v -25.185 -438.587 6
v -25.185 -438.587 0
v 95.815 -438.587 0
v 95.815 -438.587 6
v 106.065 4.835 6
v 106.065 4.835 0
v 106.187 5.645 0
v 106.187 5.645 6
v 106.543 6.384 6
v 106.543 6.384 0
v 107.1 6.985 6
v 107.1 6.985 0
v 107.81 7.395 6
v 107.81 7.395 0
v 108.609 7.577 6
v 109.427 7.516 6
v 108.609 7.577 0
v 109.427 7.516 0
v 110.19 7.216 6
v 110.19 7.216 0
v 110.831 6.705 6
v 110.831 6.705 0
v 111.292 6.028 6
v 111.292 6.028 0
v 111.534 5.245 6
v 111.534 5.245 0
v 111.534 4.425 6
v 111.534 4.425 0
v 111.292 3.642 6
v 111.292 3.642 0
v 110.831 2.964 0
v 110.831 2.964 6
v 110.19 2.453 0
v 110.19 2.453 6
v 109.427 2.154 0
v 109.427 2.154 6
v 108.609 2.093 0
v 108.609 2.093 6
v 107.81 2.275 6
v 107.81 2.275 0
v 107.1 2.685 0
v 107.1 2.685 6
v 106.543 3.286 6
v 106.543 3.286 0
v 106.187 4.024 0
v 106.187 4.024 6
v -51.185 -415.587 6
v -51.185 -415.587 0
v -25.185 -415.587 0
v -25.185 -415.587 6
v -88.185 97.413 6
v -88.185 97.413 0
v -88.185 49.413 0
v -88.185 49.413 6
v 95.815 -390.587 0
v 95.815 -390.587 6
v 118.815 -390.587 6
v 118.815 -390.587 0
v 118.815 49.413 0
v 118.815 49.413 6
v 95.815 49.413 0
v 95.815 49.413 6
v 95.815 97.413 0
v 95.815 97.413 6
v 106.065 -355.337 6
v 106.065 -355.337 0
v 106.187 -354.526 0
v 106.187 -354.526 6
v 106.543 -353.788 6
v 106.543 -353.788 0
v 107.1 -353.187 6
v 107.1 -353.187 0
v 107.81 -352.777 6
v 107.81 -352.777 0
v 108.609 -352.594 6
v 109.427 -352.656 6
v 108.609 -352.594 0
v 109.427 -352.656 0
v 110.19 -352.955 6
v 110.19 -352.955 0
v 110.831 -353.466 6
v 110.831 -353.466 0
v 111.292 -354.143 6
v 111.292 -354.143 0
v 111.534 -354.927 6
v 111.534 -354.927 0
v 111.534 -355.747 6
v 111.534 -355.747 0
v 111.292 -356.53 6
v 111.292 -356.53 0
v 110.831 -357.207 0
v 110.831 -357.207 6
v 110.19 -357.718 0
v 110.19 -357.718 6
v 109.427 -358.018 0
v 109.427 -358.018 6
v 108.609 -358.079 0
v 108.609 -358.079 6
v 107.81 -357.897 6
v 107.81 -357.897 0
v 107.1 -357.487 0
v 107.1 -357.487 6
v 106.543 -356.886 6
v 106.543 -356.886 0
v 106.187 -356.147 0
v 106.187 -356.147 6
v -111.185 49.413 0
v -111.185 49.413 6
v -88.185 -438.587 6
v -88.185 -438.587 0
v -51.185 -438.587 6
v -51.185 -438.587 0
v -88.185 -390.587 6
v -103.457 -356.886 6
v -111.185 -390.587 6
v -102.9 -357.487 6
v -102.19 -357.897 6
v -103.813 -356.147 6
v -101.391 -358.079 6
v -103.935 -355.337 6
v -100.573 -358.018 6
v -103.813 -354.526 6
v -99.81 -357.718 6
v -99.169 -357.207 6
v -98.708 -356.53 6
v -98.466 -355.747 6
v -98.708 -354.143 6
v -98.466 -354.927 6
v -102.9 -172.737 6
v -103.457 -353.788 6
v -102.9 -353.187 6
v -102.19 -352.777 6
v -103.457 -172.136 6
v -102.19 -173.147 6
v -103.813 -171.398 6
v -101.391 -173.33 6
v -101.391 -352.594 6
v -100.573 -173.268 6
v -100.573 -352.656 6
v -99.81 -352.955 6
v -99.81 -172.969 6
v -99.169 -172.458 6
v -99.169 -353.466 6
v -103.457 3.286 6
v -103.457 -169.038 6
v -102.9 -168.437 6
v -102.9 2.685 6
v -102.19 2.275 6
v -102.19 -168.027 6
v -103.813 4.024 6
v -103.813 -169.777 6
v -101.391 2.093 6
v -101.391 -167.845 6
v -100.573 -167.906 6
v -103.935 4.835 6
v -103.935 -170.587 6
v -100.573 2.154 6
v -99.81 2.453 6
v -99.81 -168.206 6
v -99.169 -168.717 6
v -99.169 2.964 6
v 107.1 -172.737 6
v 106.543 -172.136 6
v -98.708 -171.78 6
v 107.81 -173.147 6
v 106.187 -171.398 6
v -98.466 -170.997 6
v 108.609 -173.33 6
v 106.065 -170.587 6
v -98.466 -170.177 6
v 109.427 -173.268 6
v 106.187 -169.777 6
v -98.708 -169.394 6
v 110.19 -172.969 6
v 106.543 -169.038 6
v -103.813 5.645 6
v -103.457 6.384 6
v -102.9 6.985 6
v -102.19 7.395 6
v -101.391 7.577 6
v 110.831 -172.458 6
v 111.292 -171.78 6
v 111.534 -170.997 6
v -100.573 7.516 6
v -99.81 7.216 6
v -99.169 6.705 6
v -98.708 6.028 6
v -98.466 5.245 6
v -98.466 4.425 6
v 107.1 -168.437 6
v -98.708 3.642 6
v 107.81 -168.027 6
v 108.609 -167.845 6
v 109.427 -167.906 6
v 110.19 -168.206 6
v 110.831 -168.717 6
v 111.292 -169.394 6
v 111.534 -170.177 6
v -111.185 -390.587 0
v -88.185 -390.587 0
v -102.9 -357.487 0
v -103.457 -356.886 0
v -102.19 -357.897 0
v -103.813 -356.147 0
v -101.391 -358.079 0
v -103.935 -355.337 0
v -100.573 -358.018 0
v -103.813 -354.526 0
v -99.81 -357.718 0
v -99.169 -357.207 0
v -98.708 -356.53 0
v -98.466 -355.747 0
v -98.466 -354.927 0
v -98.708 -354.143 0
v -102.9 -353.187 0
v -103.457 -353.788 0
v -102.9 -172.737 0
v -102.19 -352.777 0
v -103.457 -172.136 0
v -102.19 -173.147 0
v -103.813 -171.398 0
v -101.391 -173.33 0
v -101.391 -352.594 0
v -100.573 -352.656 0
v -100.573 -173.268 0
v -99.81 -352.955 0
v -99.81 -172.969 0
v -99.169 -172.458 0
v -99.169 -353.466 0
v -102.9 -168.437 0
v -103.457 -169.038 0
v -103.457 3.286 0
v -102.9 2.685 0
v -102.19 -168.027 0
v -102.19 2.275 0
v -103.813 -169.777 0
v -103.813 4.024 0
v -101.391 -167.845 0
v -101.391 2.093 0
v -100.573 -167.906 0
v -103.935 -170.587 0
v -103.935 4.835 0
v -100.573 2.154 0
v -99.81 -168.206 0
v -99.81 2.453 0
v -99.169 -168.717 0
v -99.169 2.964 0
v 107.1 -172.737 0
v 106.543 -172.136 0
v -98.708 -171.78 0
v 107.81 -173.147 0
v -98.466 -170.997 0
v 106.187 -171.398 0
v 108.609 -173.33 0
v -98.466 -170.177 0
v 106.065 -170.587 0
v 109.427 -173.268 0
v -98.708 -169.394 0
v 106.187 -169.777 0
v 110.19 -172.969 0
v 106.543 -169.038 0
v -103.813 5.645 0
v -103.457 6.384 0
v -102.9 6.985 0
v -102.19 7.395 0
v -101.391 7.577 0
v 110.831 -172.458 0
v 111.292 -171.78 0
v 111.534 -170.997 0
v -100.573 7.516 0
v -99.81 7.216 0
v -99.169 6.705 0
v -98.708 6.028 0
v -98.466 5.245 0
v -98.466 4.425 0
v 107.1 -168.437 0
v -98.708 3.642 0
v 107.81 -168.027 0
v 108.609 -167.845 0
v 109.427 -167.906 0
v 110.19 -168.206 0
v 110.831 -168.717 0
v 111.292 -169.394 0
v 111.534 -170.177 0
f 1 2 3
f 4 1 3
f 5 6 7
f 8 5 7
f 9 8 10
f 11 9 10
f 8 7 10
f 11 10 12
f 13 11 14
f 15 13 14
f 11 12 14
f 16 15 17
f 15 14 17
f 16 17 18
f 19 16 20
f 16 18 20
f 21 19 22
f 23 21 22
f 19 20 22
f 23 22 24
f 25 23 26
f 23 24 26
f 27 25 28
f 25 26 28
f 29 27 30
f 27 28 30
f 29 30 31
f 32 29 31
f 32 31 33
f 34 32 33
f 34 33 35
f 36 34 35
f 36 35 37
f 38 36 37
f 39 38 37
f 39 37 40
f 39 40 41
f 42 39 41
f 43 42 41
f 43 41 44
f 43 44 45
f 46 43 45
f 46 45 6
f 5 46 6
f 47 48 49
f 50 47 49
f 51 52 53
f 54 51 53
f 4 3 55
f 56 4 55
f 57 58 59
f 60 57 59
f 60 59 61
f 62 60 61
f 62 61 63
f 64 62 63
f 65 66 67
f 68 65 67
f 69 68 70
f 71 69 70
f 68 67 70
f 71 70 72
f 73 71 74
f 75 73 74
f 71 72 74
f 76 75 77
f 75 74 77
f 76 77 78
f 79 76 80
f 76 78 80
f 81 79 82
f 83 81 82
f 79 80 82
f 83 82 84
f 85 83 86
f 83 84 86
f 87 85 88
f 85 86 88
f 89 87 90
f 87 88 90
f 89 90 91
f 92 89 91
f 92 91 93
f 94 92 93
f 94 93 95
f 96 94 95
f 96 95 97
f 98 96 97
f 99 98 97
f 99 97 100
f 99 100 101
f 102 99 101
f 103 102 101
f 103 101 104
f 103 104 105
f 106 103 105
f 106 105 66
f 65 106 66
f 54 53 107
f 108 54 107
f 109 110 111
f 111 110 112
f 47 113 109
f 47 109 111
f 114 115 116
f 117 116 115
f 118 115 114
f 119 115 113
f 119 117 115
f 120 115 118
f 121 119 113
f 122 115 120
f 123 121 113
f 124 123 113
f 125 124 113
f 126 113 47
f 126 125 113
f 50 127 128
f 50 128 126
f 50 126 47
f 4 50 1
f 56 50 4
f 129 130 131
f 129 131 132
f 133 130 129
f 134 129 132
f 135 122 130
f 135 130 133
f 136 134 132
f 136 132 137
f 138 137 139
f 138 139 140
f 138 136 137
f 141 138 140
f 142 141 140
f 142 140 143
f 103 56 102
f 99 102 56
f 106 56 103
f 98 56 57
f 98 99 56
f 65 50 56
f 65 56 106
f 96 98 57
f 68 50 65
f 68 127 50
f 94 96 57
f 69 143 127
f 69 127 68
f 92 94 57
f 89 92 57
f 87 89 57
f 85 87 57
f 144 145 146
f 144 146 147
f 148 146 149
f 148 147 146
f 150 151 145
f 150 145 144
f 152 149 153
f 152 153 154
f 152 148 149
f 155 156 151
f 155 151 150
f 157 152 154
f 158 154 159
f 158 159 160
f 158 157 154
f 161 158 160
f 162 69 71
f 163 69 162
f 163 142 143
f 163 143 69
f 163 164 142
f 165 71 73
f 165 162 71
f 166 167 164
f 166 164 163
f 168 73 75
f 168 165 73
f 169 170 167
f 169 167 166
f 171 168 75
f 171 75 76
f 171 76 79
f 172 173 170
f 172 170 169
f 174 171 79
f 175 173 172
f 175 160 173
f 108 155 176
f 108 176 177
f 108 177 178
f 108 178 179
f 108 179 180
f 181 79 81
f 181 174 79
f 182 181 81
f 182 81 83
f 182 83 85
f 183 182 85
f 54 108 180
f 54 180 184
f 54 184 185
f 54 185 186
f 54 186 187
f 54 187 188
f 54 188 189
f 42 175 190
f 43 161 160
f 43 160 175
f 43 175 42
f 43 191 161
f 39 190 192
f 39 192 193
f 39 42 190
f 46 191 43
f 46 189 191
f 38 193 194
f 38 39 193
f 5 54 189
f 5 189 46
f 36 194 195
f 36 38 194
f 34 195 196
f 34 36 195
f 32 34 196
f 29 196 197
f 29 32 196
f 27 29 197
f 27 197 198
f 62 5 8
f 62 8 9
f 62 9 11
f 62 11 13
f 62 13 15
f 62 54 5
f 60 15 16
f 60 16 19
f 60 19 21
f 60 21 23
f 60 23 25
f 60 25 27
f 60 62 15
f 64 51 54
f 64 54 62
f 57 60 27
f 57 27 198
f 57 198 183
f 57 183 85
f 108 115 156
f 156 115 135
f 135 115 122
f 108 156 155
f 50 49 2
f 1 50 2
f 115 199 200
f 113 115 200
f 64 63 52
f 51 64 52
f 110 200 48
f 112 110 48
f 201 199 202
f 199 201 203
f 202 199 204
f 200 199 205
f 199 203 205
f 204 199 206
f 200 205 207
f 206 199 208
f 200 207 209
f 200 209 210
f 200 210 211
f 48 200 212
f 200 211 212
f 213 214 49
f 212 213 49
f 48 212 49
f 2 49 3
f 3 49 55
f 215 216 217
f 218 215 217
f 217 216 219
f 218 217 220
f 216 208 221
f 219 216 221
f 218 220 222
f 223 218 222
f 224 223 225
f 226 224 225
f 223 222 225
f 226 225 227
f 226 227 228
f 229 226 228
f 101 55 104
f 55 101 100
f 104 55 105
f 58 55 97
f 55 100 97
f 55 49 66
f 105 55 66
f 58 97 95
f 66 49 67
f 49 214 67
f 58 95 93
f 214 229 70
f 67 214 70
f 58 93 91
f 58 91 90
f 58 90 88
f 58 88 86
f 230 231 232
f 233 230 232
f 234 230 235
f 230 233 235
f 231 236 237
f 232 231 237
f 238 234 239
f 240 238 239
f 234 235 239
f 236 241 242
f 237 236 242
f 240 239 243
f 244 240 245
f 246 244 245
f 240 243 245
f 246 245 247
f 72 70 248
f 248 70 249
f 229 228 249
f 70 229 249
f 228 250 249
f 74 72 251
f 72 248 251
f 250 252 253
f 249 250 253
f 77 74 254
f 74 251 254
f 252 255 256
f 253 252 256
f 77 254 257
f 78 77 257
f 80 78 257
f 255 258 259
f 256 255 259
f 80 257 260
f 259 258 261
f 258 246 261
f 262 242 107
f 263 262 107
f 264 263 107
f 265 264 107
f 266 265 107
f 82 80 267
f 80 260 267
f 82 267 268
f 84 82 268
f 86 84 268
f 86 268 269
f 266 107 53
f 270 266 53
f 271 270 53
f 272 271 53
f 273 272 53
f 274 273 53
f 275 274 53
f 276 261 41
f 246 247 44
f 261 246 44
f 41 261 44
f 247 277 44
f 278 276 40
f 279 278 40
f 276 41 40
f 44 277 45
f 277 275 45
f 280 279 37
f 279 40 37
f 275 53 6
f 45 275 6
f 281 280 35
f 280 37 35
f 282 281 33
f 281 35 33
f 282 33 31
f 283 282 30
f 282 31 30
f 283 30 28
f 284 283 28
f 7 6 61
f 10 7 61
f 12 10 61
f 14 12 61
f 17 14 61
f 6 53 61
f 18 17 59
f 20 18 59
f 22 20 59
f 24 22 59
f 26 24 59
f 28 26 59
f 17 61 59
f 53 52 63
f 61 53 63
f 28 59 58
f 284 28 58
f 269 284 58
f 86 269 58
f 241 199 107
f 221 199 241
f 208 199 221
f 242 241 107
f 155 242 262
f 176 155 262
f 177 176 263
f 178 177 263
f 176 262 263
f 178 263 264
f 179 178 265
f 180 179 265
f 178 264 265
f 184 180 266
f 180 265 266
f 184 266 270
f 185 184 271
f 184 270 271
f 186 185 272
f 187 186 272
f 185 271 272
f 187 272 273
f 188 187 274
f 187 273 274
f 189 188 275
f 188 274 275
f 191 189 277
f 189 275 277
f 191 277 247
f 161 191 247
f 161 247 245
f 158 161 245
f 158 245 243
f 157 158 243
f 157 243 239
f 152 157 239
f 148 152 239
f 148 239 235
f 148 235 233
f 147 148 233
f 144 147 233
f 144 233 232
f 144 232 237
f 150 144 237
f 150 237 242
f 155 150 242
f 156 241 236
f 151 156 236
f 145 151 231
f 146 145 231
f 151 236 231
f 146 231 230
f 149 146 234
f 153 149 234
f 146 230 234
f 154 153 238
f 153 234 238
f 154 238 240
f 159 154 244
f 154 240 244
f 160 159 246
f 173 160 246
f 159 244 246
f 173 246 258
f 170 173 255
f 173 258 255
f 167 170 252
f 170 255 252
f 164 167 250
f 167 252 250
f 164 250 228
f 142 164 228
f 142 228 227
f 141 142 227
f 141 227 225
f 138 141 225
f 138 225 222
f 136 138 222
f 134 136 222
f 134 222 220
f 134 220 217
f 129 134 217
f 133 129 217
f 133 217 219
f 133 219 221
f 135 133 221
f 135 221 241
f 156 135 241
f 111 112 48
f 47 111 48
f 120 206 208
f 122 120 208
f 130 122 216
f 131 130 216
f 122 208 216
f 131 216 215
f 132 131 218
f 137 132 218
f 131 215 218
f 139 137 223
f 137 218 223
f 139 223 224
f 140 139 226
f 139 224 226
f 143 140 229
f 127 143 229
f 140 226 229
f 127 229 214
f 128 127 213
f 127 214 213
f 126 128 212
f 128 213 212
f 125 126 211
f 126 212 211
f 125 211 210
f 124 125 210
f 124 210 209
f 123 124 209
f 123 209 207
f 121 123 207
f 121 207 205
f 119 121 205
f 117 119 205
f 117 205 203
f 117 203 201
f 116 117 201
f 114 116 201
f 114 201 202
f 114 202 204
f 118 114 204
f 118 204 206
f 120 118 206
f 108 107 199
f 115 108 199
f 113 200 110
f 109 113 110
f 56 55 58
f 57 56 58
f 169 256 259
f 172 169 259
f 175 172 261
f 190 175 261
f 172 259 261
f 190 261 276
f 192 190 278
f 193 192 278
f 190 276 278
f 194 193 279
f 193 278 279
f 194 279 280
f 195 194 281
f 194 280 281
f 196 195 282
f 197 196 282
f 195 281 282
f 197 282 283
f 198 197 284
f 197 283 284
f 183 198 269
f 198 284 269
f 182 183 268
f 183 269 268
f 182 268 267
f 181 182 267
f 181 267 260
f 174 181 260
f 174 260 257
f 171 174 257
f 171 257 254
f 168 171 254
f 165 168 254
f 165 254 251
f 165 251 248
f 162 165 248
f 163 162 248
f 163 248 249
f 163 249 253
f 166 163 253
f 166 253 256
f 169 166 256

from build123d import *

# Parameters (mm, degrees)
BOSS_EXTRUDE1_DEPTH = 6
SKETCH2_R           = 2.75
CUT_EXTRUDE1_DEPTH  = 10


with BuildPart() as part:
    # Sketch1 → Boss-Extrude1 (new body)
    with BuildSketch(Plane.XY):
        Polygon((95.814780717, -438.587306273), (95.814780717, -390.58730627), (118.814780717, -390.58730627), (118.814780717, 49.41269373), (95.814780717, 49.41269373), (95.814780717, 97.41269373), (-88.185219283, 97.41269373), (-88.185219283, 49.41269373), (-111.185219283, 49.41269373), (-111.185219283, -390.58730627), (-88.185219283, -390.58730627), (-88.185219283, -438.587306273), (-51.185219283, -438.587306273), (-51.185219283, -415.587306273), (-25.185219283, -415.587306273), (-25.185219283, -438.587306273), align=None)
    extrude(amount=BOSS_EXTRUDE1_DEPTH)

    # Sketch2 → Cut-Extrude1 (cut)
    with BuildSketch(Plane(origin=(0, 0, 0), x_dir=(-1, 0, 0), z_dir=(0, 0, -1))):
        with Locations((-108.814780717, -170.58730627)):
            Circle(SKETCH2_R)
        with Locations((-108.814780717, 4.834891165)):
            Circle(SKETCH2_R)
        with Locations((-108.814780717, -355.336655309)):
            Circle(SKETCH2_R)
        with Locations((101.185219283, 4.834891165)):
            Circle(SKETCH2_R)
        with Locations((101.185219283, -170.58730627)):
            Circle(SKETCH2_R)
        with Locations((101.185219283, -355.336655309)):
            Circle(SKETCH2_R)
    extrude(amount=-CUT_EXTRUDE1_DEPTH, mode=Mode.SUBTRACT)


solid = part.part
